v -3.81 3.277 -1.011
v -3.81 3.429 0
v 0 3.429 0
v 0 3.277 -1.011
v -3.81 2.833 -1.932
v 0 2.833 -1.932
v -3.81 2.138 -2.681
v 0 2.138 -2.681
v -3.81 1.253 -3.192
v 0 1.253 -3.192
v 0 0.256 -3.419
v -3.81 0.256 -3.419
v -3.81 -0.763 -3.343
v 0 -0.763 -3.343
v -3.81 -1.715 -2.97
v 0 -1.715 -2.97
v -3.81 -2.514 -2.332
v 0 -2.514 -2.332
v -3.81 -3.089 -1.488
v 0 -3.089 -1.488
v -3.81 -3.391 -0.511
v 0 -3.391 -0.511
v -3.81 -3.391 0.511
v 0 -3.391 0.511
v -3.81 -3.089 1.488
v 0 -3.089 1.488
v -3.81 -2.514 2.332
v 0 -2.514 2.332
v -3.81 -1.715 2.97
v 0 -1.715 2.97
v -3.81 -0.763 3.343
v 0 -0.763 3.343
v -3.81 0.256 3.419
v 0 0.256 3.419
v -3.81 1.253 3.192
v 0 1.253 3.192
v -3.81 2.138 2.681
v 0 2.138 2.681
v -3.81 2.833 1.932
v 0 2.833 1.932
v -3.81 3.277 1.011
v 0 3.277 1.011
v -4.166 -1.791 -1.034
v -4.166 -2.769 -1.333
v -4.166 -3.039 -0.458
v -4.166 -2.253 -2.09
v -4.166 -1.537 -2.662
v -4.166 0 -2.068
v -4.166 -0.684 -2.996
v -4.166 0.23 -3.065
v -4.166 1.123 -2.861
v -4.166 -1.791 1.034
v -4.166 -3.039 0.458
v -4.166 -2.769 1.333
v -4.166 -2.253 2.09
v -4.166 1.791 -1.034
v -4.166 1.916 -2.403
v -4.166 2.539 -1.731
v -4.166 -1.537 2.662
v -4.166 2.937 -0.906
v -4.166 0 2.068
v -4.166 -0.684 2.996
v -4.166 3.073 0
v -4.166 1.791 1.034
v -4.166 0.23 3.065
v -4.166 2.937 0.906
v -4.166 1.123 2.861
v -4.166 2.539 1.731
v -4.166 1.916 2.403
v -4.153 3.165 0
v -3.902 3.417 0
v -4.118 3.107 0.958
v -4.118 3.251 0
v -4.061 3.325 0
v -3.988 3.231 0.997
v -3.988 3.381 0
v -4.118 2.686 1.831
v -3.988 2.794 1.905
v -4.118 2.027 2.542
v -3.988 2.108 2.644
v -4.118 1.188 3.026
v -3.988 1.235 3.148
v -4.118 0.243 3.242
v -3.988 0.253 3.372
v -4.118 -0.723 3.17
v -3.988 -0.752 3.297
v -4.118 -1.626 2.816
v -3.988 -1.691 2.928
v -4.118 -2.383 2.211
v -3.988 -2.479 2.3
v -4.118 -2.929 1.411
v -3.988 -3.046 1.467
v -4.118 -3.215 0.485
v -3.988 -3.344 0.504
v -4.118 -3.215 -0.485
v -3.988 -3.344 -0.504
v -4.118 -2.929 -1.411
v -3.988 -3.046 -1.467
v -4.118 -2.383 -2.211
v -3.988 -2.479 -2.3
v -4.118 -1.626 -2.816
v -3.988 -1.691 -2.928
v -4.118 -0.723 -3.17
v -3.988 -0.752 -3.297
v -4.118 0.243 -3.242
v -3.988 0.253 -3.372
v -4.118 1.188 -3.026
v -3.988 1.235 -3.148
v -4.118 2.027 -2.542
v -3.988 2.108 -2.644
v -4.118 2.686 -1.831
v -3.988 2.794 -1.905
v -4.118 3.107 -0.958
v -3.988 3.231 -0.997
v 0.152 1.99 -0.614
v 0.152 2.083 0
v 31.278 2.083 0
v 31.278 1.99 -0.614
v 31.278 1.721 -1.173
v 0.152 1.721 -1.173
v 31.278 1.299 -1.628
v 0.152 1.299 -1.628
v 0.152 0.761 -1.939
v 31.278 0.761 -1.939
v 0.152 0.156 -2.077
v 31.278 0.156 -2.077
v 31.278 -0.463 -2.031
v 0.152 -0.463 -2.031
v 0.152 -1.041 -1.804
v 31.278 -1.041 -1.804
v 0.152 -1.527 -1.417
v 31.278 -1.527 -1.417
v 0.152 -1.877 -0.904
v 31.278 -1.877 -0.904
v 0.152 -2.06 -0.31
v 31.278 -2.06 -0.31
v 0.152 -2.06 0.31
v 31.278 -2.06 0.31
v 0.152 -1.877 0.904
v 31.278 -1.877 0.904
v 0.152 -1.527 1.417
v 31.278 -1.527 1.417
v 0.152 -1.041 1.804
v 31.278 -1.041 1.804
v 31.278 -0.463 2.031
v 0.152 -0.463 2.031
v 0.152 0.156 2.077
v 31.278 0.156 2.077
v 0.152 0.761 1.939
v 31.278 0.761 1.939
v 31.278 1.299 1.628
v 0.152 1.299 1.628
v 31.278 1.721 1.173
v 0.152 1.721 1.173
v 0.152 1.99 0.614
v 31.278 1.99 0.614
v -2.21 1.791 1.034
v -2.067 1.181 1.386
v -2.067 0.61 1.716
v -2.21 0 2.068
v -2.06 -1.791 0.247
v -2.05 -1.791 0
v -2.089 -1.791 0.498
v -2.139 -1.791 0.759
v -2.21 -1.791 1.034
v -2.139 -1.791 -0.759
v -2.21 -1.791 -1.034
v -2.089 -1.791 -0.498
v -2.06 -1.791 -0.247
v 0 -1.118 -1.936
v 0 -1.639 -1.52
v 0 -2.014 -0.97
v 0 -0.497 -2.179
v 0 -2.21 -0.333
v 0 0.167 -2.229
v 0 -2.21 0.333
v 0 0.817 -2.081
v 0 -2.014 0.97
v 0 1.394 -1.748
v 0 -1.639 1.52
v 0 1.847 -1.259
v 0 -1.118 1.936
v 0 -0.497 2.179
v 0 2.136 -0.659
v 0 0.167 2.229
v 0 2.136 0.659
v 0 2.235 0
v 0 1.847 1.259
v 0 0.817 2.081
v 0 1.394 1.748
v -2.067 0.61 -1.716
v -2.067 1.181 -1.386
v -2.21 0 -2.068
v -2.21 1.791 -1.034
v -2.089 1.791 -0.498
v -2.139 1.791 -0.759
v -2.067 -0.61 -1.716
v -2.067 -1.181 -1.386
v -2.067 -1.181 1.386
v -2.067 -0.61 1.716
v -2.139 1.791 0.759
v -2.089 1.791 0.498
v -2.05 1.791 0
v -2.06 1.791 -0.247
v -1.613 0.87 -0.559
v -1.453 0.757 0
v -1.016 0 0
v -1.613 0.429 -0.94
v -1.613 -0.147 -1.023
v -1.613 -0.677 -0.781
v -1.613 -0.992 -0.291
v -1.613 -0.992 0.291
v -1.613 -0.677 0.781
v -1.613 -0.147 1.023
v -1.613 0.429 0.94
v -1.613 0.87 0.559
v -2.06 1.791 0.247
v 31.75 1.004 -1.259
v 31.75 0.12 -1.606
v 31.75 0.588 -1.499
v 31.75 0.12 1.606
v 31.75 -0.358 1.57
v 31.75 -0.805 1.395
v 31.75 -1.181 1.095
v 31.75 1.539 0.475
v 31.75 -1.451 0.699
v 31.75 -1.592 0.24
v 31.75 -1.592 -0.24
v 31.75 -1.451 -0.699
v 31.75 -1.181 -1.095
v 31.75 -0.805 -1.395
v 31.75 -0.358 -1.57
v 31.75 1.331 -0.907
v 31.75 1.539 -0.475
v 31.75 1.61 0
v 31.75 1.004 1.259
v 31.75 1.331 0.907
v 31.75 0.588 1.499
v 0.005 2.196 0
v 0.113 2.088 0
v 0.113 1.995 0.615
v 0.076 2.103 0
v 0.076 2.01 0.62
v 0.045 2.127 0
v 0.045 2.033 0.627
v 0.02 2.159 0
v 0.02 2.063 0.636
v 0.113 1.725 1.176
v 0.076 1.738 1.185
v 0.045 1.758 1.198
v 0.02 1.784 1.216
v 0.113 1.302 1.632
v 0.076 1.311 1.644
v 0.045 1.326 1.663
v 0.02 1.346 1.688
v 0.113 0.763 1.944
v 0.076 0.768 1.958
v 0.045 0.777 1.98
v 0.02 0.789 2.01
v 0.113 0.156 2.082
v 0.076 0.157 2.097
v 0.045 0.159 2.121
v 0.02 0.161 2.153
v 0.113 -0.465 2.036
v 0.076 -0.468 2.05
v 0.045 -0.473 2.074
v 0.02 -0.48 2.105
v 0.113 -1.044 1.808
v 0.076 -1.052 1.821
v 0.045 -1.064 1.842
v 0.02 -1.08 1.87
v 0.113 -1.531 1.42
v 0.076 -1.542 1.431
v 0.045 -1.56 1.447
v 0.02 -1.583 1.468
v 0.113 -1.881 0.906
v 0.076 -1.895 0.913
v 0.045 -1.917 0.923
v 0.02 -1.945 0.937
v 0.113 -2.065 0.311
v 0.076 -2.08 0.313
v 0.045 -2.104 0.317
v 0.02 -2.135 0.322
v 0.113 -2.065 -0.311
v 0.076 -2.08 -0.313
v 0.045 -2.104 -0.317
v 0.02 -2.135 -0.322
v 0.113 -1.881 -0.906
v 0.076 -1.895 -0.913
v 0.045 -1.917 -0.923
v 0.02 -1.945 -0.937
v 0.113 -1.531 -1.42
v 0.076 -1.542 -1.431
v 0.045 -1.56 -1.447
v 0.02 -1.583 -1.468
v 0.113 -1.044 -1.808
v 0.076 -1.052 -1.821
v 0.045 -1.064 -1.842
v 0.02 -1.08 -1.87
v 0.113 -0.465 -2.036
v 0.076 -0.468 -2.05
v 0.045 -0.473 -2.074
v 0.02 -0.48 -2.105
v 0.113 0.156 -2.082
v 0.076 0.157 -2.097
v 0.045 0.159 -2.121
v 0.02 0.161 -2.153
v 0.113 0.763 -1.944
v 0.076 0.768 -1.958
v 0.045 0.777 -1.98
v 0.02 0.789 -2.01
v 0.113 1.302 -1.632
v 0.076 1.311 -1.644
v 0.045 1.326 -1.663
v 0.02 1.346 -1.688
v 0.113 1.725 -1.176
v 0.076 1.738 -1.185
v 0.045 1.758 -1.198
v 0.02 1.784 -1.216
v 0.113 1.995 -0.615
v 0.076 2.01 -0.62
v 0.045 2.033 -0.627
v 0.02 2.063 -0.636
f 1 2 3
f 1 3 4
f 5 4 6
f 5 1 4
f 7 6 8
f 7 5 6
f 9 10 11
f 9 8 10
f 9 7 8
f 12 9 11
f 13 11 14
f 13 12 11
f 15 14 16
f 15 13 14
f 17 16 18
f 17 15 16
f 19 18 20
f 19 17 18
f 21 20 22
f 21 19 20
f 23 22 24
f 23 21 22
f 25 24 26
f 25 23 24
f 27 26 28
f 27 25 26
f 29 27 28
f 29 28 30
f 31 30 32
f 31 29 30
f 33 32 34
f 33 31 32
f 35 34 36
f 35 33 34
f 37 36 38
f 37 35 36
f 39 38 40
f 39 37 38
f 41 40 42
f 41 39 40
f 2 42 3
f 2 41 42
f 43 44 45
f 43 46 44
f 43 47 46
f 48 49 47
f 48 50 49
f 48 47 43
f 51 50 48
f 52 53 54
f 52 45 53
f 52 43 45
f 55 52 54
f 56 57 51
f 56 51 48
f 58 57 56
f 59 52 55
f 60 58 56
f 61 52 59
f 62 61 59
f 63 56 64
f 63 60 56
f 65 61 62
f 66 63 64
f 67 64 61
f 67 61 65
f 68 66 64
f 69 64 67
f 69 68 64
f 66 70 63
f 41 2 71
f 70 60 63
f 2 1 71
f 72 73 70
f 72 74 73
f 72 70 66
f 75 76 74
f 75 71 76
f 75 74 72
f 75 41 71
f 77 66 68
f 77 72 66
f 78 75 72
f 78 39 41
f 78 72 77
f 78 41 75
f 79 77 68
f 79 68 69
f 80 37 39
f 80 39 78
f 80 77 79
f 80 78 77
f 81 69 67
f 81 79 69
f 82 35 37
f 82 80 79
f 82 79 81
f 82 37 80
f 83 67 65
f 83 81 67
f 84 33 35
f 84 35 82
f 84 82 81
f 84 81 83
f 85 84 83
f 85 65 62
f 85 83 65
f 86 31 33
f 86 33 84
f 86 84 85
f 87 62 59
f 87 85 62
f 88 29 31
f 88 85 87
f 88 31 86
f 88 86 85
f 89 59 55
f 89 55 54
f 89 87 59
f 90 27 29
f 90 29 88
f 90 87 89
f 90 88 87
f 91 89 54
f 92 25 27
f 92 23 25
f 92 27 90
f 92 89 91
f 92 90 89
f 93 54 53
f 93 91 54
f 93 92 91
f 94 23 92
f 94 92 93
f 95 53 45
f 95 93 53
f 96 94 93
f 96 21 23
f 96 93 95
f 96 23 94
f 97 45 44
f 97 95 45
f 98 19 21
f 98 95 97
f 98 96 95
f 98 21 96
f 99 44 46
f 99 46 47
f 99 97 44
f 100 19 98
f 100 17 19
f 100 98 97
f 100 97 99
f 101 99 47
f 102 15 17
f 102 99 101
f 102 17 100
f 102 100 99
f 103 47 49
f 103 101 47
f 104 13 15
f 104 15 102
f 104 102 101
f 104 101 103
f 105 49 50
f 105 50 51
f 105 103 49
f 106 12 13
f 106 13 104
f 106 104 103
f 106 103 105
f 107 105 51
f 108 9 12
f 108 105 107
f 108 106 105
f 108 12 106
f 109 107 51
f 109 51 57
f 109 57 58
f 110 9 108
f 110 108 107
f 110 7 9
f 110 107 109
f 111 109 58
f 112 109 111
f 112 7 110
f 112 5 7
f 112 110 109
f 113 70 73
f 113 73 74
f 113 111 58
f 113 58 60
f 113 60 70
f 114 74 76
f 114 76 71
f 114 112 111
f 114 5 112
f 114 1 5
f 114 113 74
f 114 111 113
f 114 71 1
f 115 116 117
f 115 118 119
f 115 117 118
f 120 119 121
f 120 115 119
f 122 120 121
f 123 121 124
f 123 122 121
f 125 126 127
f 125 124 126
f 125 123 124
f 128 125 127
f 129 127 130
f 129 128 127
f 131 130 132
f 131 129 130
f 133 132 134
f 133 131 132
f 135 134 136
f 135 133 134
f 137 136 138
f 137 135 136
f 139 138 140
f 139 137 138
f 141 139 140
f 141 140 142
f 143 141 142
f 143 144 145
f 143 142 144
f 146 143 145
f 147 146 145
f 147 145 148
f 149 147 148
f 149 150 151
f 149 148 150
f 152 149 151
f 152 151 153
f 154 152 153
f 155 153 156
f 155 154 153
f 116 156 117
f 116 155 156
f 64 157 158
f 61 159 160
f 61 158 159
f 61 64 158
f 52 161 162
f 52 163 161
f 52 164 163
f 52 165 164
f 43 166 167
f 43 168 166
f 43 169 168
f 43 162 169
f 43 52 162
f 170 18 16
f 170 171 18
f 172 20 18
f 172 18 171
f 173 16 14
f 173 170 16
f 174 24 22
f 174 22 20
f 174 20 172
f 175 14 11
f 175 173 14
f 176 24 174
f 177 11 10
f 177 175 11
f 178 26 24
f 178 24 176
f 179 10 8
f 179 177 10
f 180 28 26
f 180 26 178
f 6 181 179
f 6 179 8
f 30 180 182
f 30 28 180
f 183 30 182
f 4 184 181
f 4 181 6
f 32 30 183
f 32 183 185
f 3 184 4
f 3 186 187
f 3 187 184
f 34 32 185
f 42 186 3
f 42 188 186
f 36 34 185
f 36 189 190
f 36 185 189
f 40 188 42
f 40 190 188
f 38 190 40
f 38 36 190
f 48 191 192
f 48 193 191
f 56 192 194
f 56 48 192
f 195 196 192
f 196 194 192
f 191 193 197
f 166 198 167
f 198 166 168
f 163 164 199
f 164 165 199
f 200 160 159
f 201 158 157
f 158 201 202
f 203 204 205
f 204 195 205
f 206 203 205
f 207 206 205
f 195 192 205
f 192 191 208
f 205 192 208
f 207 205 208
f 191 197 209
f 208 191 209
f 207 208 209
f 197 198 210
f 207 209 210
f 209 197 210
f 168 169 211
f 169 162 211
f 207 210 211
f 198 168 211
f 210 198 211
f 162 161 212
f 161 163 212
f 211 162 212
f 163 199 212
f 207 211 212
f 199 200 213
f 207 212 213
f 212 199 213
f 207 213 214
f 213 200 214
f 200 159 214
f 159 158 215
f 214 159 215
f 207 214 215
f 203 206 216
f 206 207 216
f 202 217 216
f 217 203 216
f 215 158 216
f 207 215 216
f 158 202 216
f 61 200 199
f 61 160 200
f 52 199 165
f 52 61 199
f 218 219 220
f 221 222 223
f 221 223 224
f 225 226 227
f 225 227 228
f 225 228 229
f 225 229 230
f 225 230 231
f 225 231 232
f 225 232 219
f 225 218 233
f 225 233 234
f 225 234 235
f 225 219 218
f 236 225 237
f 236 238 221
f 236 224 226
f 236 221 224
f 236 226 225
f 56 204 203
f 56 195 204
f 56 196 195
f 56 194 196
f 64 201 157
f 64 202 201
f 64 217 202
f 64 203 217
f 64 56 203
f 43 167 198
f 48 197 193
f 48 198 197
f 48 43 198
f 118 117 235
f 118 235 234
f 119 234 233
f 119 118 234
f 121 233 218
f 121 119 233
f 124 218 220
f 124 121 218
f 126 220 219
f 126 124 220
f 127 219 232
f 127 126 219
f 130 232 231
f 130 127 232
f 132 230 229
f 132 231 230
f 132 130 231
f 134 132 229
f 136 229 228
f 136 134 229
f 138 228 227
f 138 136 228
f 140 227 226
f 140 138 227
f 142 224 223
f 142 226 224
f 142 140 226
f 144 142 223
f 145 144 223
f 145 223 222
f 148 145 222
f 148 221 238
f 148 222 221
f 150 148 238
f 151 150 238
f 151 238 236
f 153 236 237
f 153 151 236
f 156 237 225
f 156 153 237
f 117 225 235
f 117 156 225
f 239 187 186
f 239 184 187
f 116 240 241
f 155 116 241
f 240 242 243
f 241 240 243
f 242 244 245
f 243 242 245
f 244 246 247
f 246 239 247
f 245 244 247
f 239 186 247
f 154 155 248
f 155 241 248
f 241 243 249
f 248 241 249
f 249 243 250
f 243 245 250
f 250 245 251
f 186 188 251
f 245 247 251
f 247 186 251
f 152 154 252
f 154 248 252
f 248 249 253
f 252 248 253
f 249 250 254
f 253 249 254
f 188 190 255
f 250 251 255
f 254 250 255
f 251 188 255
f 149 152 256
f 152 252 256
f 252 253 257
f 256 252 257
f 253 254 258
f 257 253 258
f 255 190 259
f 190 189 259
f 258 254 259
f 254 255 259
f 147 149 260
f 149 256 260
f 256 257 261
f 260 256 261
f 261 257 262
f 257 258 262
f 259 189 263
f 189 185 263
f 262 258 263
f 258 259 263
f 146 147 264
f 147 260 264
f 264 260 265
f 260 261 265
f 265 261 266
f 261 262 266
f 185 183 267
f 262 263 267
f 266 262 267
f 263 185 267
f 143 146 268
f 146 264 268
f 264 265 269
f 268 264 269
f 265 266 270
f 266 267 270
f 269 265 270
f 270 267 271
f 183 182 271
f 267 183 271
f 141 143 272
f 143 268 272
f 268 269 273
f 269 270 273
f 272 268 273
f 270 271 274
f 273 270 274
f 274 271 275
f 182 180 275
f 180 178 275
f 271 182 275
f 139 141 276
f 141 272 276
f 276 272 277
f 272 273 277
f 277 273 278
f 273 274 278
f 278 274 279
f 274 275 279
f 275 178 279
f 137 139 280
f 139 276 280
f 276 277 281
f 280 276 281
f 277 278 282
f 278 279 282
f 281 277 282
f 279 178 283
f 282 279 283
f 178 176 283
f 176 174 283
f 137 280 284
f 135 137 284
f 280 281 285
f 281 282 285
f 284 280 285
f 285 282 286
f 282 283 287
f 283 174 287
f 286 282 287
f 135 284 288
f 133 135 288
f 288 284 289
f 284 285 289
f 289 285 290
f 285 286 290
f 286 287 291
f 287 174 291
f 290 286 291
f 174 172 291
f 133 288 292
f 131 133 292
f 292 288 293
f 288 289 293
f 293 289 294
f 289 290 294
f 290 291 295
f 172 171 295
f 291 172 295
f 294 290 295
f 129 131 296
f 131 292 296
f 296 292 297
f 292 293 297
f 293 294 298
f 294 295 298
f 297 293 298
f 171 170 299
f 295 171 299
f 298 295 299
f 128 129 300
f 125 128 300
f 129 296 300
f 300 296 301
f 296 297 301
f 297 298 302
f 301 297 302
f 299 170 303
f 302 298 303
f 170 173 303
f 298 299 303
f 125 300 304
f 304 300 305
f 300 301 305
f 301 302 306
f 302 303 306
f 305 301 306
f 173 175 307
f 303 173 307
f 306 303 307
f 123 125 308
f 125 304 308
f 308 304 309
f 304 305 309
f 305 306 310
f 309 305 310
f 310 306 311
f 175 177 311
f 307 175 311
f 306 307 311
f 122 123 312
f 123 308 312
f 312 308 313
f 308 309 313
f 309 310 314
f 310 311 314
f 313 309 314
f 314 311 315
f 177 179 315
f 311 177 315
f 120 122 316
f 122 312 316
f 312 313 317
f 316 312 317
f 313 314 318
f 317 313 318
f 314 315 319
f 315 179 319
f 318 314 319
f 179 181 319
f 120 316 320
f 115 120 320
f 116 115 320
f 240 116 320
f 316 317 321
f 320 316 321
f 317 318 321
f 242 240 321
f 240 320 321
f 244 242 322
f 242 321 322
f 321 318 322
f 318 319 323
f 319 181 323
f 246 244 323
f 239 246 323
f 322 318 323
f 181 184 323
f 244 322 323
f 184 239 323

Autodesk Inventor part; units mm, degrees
ref_plane "YZ Plane" through (0, 0, 0) normal (1, 0, 0) x (0, 1, 0)
ref_plane "XZ Plane" through (0, 0, 0) normal (0, 1, 0) x (-1, 0, 0)
sketch "Sketch1" plane through (0, 0, 0) normal (0, 0, 1) x (1, 0, 0)
  line L0 (-1.016, 0) -> (31.75, 0)
  line L1 (31.75, 0) -> (31.75, 2.0828)
  line L2 (31.75, 2.0828) -> (9.652, 2.0828)
  line L3 (9.652, 2.0828) -> (7.6677, 2.0828)
  line L4 (7.6677, 2.0828) -> (0, 2.0828)
  line L5 (0, 2.0828) -> (0, 3.429)
  line L6 (0, 3.429) -> (-4.1656, 3.429)
  line L7 (-4.1656, 3.429) -> (-4.1656, 2.0677)
  line L8 (-4.1656, 2.0677) -> (-2.2098, 2.0677)
  line L9 (-2.2098, 2.0677) -> (-1.016, 0)
  line L10 (-11.3487, 0) -> (38.9331, 0) projected
  line L11 (0, -0.6858) -> (0, 4.1148) projected
  line L12 (9.652, 2.0828) -> (0, 2.0828) construction
  dimension "d1" = 22.098
  dimension "d2" = 1.9844
  dimension "d3" = 4.1656
  dimension "d4" = 1.9558
  dimension "d5" = 60
  dimension "d6" = 4.1656
  dimension "d7" = 4.1656
  dimension "d8" = 4.1354
  dimension "d9" = 6.858
  dimension "d26" = 31.75
revolve "Body" add sketch "Sketch1" angle 360 about axis through (-1.016, 0, 0) along (1, 0, 0)
sketch "Sketch2" plane through (-4.1656, 0, 0) normal (-1, 0, 0) x (0, 0, 1)
  circle A0 centre (0, 0) radius 2.0677 projected
  line L0 (0, -4.8006) -> (0, 4.8006) projected
  line L1 (-4.8006, 0) -> (4.8006, 0) projected
  line L2 (2.0677, 0) -> (1.0339, -1.7907)
  line L3 (1.0339, -1.7907) -> (-1.0339, -1.7907)
  line L4 (-1.0339, -1.7907) -> (-2.0677, 0)
  line L5 (-2.0677, 0) -> (-1.0339, 1.7907)
  line L6 (-1.0339, 1.7907) -> (1.0339, 1.7907)
  line L7 (1.0339, 1.7907) -> (2.0677, 0)
extrude "Slot" add sketch "Sketch2" against normal up to next contours L7 A0 | A0 L2 | L6 L0 A0 | A0 L0 L3 | L0 L6 A0 | A0 L3 L0 | L4 A0 | A0 L5
fillet "Fillet1" radius 0.3556 1 edges at (-4.1656, -3.429, 0)
thread "Thread" size "8-32 UNC" class "2A" standard "ANSI Unified Screw Threads" length 22.098
chamfer "Chamfer1" distance 0.4724 distance2 0.4724 1 edges at (31.75, -2.0828, 0) measured on face at (31.75, 0.2462, 0.6492)
ref_plane "Work Plane1" through (29, 0, 0) normal (0, -1, 0) x (1, 0, 0)
fillet "Fillet2" radius 0.1524 1 edges at (0, -2.0828, 0)
equation "\"d1\" = GEL"
equation "\"d3\" = KOH"
equation "\"d4\" = INTI"
equation "\"d6\" = GD"
equation "\"d7\" = BDM"
equation "\"d8\" = 1.1547 * SW"
equation "\"d9\" = KOD"
equation "\"d26\" = NLG"
equation "\"d30\" = R"
equation "\"d17\" = RR"
equation "\"d13\" = GEL"
equation "\"d15\" = -0.5 * SPD + 0.5 * GD"
equation "\"d16\" = GUL"
equation "\"GD\" = 4.1656"
equation "\"NLG\" = 31.75"
equation "\"GEL\" = 22.098"
equation "\"KOD\" = 6.858"
equation "\"KOH\" = 4.1656"
equation "\"INTI\" = 1.9558"
equation "\"GAL\" = 1.98425"
equation "\"GUL\" = 0.47244"
equation "\"BDM\" = 4.1656"
equation "\"SW\" = 3.5814"
equation "\"RR\" = 0.3556"
equation "\"SPD\" = 3.22072"
equation "\"R\" = 0.1524"
equation "\"PHH\" = 0.127"
equation "\"GD1\" = SPD"
equation "\"THREADDIA\" = 4.1656"
equation "\"FAWI\" = 45deg"
equation "\"KOH1\" = 3.7592"
equation "\"NND\" = 4.1656"
equation "\"TOA\" = 30deg"
equation "\"E0\" = 1.155 * SW"
properties part number "ANSI B18.3 - No. 8 - 32 UNC - 1 1/4 HS HCS" material "Steel, Mild"
